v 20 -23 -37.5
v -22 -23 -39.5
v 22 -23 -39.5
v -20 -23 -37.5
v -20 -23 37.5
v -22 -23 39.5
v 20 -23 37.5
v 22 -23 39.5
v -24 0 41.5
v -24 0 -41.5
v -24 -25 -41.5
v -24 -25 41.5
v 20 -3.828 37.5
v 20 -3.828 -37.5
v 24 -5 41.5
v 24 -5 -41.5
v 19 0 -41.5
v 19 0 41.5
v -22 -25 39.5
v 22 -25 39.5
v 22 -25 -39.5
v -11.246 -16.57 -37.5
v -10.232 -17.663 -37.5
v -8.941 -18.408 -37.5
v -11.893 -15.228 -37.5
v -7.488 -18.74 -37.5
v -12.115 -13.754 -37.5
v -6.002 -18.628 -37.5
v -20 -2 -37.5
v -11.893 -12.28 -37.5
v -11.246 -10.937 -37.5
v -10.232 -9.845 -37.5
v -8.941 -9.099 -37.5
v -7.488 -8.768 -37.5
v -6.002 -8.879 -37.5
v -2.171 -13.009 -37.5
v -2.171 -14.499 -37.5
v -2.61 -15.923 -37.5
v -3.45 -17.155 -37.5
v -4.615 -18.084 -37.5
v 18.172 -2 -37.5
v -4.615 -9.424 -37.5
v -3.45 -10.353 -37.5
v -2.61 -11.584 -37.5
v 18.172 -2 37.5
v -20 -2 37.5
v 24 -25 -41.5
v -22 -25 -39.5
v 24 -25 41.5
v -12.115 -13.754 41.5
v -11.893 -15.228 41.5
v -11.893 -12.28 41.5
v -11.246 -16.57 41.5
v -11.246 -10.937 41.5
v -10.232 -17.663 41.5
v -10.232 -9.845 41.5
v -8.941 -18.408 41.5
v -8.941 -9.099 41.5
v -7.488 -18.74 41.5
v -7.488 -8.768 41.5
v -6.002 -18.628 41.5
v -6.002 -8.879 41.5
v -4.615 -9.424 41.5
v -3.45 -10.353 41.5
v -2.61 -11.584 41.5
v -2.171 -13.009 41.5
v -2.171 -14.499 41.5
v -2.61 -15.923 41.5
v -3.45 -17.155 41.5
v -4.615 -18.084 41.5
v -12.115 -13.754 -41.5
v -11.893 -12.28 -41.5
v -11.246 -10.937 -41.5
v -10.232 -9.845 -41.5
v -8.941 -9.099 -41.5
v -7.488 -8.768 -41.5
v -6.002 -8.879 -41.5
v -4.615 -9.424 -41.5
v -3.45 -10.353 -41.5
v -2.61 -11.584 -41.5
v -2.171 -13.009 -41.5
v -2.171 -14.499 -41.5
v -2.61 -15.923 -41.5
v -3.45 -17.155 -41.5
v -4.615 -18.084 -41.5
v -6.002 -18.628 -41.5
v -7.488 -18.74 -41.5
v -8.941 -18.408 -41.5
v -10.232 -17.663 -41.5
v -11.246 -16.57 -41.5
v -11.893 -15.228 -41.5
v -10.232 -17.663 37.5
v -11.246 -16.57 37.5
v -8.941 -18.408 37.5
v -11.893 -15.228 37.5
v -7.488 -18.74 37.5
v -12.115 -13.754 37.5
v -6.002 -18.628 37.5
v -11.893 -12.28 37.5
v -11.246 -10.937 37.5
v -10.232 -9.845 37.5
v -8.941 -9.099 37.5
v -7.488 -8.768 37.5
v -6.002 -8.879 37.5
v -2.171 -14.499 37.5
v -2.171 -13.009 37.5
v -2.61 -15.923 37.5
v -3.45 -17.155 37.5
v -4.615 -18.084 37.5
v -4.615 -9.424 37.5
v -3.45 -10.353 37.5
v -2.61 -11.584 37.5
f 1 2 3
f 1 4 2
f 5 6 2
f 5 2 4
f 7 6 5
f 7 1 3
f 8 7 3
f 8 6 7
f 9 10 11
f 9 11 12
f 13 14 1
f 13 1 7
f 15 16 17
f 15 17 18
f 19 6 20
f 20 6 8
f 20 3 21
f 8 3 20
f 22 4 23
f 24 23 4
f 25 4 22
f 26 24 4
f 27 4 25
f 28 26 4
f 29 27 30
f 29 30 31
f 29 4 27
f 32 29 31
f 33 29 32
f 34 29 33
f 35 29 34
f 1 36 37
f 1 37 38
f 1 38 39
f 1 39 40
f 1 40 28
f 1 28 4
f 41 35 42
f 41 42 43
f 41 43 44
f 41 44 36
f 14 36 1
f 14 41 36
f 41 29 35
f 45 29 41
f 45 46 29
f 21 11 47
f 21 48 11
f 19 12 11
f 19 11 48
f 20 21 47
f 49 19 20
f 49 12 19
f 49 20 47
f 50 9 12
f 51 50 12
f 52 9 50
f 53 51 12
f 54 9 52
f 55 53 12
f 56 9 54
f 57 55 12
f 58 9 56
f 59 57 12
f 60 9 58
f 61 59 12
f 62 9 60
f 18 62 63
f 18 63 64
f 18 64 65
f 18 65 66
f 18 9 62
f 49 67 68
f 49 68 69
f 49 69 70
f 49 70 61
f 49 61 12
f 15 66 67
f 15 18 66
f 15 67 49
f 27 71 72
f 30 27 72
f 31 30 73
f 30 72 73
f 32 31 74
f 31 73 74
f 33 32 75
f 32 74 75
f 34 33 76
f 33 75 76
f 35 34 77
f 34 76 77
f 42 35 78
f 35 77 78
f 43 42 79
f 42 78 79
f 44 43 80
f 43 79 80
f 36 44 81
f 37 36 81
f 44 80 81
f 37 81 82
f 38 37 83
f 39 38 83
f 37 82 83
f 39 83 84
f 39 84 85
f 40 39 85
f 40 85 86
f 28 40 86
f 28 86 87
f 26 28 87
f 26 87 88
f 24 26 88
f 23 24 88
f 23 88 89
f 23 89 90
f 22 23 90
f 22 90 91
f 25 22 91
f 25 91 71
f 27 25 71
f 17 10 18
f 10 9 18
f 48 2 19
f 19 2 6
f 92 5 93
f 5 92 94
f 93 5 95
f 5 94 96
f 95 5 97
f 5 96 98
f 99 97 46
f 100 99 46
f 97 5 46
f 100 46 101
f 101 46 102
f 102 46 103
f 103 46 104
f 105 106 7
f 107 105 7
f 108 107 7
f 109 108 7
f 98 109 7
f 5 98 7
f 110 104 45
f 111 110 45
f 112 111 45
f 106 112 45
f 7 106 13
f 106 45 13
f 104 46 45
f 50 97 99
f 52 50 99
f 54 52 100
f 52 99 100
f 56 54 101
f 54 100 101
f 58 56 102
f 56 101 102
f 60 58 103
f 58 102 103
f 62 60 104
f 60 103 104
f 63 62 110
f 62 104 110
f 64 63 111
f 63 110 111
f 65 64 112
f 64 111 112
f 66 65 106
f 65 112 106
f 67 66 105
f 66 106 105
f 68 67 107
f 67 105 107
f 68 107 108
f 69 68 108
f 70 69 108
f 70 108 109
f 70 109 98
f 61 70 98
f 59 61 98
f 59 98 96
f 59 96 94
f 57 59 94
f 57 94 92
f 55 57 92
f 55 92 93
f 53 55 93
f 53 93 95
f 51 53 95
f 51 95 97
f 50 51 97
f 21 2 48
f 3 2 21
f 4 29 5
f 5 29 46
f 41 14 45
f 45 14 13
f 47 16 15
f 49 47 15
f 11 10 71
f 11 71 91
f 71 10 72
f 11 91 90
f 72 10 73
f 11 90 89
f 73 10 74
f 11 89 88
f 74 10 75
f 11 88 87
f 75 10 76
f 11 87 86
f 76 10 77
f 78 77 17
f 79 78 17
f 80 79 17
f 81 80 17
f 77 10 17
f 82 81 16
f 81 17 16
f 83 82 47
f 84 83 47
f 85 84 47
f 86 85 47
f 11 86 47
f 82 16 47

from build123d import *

# Parameters (mm, degrees)
F0_W     = 48
F0_H     = 83
F0_W_2   = 44
F0_H_2   = 79
F0_W_3   = 40
F0_H_3   = 75
F1_DEPTH = 2
F2_DEPTH = 25
F3_DEPTH = 23
F4_SIZE2 = 5
F4_SIZE  = 5
F6_DEPTH = 2
F12_D    = 10


with BuildPart() as f1:
    # F0 (on Front) → F1 (new body)
    with BuildSketch(Plane.XZ):
        Rectangle(F0_W, F0_H)
        Rectangle(F0_W_2, F0_H_2, mode=Mode.SUBTRACT)
        Rectangle(F0_W_2, F0_H_2)
        Rectangle(F0_W_3, F0_H_3, mode=Mode.SUBTRACT)
        Rectangle(F0_W_3, F0_H_3)
    extrude(amount=F1_DEPTH)

    # F0 (on Front) → F2 (join)
    with BuildSketch(Plane.XZ):
        Rectangle(F0_W, F0_H)
        Rectangle(F0_W_2, F0_H_2, mode=Mode.SUBTRACT)
    extrude(amount=F2_DEPTH)

    # F0 (on Front) → F3 (join)
    with BuildSketch(Plane.XZ):
        Rectangle(F0_W_2, F0_H_2)
        Rectangle(F0_W_3, F0_H_3, mode=Mode.SUBTRACT)
    extrude(amount=F3_DEPTH)

    # F4
    f4_edges = [f1.edges().sort_by_distance(p)[0] for p in [
        (24, 0, 0),
    ]]
    chamfer(f4_edges, length=F4_SIZE, length2=F4_SIZE2)

    # F6 (add): a face of the model
    f6_faces = [f1.faces().sort_by_distance(p)[0] for p in [
        (21.5, -2.5, 0),
    ]]
    extrude(f6_faces, amount=-F6_DEPTH)

    # F12 (through all)
    with Locations(Plane.XY.offset(41.5)):
        with Locations((-7.1147754788, -13.7537298724)):
            Hole(F12_D / 2)


solid = f1.part
